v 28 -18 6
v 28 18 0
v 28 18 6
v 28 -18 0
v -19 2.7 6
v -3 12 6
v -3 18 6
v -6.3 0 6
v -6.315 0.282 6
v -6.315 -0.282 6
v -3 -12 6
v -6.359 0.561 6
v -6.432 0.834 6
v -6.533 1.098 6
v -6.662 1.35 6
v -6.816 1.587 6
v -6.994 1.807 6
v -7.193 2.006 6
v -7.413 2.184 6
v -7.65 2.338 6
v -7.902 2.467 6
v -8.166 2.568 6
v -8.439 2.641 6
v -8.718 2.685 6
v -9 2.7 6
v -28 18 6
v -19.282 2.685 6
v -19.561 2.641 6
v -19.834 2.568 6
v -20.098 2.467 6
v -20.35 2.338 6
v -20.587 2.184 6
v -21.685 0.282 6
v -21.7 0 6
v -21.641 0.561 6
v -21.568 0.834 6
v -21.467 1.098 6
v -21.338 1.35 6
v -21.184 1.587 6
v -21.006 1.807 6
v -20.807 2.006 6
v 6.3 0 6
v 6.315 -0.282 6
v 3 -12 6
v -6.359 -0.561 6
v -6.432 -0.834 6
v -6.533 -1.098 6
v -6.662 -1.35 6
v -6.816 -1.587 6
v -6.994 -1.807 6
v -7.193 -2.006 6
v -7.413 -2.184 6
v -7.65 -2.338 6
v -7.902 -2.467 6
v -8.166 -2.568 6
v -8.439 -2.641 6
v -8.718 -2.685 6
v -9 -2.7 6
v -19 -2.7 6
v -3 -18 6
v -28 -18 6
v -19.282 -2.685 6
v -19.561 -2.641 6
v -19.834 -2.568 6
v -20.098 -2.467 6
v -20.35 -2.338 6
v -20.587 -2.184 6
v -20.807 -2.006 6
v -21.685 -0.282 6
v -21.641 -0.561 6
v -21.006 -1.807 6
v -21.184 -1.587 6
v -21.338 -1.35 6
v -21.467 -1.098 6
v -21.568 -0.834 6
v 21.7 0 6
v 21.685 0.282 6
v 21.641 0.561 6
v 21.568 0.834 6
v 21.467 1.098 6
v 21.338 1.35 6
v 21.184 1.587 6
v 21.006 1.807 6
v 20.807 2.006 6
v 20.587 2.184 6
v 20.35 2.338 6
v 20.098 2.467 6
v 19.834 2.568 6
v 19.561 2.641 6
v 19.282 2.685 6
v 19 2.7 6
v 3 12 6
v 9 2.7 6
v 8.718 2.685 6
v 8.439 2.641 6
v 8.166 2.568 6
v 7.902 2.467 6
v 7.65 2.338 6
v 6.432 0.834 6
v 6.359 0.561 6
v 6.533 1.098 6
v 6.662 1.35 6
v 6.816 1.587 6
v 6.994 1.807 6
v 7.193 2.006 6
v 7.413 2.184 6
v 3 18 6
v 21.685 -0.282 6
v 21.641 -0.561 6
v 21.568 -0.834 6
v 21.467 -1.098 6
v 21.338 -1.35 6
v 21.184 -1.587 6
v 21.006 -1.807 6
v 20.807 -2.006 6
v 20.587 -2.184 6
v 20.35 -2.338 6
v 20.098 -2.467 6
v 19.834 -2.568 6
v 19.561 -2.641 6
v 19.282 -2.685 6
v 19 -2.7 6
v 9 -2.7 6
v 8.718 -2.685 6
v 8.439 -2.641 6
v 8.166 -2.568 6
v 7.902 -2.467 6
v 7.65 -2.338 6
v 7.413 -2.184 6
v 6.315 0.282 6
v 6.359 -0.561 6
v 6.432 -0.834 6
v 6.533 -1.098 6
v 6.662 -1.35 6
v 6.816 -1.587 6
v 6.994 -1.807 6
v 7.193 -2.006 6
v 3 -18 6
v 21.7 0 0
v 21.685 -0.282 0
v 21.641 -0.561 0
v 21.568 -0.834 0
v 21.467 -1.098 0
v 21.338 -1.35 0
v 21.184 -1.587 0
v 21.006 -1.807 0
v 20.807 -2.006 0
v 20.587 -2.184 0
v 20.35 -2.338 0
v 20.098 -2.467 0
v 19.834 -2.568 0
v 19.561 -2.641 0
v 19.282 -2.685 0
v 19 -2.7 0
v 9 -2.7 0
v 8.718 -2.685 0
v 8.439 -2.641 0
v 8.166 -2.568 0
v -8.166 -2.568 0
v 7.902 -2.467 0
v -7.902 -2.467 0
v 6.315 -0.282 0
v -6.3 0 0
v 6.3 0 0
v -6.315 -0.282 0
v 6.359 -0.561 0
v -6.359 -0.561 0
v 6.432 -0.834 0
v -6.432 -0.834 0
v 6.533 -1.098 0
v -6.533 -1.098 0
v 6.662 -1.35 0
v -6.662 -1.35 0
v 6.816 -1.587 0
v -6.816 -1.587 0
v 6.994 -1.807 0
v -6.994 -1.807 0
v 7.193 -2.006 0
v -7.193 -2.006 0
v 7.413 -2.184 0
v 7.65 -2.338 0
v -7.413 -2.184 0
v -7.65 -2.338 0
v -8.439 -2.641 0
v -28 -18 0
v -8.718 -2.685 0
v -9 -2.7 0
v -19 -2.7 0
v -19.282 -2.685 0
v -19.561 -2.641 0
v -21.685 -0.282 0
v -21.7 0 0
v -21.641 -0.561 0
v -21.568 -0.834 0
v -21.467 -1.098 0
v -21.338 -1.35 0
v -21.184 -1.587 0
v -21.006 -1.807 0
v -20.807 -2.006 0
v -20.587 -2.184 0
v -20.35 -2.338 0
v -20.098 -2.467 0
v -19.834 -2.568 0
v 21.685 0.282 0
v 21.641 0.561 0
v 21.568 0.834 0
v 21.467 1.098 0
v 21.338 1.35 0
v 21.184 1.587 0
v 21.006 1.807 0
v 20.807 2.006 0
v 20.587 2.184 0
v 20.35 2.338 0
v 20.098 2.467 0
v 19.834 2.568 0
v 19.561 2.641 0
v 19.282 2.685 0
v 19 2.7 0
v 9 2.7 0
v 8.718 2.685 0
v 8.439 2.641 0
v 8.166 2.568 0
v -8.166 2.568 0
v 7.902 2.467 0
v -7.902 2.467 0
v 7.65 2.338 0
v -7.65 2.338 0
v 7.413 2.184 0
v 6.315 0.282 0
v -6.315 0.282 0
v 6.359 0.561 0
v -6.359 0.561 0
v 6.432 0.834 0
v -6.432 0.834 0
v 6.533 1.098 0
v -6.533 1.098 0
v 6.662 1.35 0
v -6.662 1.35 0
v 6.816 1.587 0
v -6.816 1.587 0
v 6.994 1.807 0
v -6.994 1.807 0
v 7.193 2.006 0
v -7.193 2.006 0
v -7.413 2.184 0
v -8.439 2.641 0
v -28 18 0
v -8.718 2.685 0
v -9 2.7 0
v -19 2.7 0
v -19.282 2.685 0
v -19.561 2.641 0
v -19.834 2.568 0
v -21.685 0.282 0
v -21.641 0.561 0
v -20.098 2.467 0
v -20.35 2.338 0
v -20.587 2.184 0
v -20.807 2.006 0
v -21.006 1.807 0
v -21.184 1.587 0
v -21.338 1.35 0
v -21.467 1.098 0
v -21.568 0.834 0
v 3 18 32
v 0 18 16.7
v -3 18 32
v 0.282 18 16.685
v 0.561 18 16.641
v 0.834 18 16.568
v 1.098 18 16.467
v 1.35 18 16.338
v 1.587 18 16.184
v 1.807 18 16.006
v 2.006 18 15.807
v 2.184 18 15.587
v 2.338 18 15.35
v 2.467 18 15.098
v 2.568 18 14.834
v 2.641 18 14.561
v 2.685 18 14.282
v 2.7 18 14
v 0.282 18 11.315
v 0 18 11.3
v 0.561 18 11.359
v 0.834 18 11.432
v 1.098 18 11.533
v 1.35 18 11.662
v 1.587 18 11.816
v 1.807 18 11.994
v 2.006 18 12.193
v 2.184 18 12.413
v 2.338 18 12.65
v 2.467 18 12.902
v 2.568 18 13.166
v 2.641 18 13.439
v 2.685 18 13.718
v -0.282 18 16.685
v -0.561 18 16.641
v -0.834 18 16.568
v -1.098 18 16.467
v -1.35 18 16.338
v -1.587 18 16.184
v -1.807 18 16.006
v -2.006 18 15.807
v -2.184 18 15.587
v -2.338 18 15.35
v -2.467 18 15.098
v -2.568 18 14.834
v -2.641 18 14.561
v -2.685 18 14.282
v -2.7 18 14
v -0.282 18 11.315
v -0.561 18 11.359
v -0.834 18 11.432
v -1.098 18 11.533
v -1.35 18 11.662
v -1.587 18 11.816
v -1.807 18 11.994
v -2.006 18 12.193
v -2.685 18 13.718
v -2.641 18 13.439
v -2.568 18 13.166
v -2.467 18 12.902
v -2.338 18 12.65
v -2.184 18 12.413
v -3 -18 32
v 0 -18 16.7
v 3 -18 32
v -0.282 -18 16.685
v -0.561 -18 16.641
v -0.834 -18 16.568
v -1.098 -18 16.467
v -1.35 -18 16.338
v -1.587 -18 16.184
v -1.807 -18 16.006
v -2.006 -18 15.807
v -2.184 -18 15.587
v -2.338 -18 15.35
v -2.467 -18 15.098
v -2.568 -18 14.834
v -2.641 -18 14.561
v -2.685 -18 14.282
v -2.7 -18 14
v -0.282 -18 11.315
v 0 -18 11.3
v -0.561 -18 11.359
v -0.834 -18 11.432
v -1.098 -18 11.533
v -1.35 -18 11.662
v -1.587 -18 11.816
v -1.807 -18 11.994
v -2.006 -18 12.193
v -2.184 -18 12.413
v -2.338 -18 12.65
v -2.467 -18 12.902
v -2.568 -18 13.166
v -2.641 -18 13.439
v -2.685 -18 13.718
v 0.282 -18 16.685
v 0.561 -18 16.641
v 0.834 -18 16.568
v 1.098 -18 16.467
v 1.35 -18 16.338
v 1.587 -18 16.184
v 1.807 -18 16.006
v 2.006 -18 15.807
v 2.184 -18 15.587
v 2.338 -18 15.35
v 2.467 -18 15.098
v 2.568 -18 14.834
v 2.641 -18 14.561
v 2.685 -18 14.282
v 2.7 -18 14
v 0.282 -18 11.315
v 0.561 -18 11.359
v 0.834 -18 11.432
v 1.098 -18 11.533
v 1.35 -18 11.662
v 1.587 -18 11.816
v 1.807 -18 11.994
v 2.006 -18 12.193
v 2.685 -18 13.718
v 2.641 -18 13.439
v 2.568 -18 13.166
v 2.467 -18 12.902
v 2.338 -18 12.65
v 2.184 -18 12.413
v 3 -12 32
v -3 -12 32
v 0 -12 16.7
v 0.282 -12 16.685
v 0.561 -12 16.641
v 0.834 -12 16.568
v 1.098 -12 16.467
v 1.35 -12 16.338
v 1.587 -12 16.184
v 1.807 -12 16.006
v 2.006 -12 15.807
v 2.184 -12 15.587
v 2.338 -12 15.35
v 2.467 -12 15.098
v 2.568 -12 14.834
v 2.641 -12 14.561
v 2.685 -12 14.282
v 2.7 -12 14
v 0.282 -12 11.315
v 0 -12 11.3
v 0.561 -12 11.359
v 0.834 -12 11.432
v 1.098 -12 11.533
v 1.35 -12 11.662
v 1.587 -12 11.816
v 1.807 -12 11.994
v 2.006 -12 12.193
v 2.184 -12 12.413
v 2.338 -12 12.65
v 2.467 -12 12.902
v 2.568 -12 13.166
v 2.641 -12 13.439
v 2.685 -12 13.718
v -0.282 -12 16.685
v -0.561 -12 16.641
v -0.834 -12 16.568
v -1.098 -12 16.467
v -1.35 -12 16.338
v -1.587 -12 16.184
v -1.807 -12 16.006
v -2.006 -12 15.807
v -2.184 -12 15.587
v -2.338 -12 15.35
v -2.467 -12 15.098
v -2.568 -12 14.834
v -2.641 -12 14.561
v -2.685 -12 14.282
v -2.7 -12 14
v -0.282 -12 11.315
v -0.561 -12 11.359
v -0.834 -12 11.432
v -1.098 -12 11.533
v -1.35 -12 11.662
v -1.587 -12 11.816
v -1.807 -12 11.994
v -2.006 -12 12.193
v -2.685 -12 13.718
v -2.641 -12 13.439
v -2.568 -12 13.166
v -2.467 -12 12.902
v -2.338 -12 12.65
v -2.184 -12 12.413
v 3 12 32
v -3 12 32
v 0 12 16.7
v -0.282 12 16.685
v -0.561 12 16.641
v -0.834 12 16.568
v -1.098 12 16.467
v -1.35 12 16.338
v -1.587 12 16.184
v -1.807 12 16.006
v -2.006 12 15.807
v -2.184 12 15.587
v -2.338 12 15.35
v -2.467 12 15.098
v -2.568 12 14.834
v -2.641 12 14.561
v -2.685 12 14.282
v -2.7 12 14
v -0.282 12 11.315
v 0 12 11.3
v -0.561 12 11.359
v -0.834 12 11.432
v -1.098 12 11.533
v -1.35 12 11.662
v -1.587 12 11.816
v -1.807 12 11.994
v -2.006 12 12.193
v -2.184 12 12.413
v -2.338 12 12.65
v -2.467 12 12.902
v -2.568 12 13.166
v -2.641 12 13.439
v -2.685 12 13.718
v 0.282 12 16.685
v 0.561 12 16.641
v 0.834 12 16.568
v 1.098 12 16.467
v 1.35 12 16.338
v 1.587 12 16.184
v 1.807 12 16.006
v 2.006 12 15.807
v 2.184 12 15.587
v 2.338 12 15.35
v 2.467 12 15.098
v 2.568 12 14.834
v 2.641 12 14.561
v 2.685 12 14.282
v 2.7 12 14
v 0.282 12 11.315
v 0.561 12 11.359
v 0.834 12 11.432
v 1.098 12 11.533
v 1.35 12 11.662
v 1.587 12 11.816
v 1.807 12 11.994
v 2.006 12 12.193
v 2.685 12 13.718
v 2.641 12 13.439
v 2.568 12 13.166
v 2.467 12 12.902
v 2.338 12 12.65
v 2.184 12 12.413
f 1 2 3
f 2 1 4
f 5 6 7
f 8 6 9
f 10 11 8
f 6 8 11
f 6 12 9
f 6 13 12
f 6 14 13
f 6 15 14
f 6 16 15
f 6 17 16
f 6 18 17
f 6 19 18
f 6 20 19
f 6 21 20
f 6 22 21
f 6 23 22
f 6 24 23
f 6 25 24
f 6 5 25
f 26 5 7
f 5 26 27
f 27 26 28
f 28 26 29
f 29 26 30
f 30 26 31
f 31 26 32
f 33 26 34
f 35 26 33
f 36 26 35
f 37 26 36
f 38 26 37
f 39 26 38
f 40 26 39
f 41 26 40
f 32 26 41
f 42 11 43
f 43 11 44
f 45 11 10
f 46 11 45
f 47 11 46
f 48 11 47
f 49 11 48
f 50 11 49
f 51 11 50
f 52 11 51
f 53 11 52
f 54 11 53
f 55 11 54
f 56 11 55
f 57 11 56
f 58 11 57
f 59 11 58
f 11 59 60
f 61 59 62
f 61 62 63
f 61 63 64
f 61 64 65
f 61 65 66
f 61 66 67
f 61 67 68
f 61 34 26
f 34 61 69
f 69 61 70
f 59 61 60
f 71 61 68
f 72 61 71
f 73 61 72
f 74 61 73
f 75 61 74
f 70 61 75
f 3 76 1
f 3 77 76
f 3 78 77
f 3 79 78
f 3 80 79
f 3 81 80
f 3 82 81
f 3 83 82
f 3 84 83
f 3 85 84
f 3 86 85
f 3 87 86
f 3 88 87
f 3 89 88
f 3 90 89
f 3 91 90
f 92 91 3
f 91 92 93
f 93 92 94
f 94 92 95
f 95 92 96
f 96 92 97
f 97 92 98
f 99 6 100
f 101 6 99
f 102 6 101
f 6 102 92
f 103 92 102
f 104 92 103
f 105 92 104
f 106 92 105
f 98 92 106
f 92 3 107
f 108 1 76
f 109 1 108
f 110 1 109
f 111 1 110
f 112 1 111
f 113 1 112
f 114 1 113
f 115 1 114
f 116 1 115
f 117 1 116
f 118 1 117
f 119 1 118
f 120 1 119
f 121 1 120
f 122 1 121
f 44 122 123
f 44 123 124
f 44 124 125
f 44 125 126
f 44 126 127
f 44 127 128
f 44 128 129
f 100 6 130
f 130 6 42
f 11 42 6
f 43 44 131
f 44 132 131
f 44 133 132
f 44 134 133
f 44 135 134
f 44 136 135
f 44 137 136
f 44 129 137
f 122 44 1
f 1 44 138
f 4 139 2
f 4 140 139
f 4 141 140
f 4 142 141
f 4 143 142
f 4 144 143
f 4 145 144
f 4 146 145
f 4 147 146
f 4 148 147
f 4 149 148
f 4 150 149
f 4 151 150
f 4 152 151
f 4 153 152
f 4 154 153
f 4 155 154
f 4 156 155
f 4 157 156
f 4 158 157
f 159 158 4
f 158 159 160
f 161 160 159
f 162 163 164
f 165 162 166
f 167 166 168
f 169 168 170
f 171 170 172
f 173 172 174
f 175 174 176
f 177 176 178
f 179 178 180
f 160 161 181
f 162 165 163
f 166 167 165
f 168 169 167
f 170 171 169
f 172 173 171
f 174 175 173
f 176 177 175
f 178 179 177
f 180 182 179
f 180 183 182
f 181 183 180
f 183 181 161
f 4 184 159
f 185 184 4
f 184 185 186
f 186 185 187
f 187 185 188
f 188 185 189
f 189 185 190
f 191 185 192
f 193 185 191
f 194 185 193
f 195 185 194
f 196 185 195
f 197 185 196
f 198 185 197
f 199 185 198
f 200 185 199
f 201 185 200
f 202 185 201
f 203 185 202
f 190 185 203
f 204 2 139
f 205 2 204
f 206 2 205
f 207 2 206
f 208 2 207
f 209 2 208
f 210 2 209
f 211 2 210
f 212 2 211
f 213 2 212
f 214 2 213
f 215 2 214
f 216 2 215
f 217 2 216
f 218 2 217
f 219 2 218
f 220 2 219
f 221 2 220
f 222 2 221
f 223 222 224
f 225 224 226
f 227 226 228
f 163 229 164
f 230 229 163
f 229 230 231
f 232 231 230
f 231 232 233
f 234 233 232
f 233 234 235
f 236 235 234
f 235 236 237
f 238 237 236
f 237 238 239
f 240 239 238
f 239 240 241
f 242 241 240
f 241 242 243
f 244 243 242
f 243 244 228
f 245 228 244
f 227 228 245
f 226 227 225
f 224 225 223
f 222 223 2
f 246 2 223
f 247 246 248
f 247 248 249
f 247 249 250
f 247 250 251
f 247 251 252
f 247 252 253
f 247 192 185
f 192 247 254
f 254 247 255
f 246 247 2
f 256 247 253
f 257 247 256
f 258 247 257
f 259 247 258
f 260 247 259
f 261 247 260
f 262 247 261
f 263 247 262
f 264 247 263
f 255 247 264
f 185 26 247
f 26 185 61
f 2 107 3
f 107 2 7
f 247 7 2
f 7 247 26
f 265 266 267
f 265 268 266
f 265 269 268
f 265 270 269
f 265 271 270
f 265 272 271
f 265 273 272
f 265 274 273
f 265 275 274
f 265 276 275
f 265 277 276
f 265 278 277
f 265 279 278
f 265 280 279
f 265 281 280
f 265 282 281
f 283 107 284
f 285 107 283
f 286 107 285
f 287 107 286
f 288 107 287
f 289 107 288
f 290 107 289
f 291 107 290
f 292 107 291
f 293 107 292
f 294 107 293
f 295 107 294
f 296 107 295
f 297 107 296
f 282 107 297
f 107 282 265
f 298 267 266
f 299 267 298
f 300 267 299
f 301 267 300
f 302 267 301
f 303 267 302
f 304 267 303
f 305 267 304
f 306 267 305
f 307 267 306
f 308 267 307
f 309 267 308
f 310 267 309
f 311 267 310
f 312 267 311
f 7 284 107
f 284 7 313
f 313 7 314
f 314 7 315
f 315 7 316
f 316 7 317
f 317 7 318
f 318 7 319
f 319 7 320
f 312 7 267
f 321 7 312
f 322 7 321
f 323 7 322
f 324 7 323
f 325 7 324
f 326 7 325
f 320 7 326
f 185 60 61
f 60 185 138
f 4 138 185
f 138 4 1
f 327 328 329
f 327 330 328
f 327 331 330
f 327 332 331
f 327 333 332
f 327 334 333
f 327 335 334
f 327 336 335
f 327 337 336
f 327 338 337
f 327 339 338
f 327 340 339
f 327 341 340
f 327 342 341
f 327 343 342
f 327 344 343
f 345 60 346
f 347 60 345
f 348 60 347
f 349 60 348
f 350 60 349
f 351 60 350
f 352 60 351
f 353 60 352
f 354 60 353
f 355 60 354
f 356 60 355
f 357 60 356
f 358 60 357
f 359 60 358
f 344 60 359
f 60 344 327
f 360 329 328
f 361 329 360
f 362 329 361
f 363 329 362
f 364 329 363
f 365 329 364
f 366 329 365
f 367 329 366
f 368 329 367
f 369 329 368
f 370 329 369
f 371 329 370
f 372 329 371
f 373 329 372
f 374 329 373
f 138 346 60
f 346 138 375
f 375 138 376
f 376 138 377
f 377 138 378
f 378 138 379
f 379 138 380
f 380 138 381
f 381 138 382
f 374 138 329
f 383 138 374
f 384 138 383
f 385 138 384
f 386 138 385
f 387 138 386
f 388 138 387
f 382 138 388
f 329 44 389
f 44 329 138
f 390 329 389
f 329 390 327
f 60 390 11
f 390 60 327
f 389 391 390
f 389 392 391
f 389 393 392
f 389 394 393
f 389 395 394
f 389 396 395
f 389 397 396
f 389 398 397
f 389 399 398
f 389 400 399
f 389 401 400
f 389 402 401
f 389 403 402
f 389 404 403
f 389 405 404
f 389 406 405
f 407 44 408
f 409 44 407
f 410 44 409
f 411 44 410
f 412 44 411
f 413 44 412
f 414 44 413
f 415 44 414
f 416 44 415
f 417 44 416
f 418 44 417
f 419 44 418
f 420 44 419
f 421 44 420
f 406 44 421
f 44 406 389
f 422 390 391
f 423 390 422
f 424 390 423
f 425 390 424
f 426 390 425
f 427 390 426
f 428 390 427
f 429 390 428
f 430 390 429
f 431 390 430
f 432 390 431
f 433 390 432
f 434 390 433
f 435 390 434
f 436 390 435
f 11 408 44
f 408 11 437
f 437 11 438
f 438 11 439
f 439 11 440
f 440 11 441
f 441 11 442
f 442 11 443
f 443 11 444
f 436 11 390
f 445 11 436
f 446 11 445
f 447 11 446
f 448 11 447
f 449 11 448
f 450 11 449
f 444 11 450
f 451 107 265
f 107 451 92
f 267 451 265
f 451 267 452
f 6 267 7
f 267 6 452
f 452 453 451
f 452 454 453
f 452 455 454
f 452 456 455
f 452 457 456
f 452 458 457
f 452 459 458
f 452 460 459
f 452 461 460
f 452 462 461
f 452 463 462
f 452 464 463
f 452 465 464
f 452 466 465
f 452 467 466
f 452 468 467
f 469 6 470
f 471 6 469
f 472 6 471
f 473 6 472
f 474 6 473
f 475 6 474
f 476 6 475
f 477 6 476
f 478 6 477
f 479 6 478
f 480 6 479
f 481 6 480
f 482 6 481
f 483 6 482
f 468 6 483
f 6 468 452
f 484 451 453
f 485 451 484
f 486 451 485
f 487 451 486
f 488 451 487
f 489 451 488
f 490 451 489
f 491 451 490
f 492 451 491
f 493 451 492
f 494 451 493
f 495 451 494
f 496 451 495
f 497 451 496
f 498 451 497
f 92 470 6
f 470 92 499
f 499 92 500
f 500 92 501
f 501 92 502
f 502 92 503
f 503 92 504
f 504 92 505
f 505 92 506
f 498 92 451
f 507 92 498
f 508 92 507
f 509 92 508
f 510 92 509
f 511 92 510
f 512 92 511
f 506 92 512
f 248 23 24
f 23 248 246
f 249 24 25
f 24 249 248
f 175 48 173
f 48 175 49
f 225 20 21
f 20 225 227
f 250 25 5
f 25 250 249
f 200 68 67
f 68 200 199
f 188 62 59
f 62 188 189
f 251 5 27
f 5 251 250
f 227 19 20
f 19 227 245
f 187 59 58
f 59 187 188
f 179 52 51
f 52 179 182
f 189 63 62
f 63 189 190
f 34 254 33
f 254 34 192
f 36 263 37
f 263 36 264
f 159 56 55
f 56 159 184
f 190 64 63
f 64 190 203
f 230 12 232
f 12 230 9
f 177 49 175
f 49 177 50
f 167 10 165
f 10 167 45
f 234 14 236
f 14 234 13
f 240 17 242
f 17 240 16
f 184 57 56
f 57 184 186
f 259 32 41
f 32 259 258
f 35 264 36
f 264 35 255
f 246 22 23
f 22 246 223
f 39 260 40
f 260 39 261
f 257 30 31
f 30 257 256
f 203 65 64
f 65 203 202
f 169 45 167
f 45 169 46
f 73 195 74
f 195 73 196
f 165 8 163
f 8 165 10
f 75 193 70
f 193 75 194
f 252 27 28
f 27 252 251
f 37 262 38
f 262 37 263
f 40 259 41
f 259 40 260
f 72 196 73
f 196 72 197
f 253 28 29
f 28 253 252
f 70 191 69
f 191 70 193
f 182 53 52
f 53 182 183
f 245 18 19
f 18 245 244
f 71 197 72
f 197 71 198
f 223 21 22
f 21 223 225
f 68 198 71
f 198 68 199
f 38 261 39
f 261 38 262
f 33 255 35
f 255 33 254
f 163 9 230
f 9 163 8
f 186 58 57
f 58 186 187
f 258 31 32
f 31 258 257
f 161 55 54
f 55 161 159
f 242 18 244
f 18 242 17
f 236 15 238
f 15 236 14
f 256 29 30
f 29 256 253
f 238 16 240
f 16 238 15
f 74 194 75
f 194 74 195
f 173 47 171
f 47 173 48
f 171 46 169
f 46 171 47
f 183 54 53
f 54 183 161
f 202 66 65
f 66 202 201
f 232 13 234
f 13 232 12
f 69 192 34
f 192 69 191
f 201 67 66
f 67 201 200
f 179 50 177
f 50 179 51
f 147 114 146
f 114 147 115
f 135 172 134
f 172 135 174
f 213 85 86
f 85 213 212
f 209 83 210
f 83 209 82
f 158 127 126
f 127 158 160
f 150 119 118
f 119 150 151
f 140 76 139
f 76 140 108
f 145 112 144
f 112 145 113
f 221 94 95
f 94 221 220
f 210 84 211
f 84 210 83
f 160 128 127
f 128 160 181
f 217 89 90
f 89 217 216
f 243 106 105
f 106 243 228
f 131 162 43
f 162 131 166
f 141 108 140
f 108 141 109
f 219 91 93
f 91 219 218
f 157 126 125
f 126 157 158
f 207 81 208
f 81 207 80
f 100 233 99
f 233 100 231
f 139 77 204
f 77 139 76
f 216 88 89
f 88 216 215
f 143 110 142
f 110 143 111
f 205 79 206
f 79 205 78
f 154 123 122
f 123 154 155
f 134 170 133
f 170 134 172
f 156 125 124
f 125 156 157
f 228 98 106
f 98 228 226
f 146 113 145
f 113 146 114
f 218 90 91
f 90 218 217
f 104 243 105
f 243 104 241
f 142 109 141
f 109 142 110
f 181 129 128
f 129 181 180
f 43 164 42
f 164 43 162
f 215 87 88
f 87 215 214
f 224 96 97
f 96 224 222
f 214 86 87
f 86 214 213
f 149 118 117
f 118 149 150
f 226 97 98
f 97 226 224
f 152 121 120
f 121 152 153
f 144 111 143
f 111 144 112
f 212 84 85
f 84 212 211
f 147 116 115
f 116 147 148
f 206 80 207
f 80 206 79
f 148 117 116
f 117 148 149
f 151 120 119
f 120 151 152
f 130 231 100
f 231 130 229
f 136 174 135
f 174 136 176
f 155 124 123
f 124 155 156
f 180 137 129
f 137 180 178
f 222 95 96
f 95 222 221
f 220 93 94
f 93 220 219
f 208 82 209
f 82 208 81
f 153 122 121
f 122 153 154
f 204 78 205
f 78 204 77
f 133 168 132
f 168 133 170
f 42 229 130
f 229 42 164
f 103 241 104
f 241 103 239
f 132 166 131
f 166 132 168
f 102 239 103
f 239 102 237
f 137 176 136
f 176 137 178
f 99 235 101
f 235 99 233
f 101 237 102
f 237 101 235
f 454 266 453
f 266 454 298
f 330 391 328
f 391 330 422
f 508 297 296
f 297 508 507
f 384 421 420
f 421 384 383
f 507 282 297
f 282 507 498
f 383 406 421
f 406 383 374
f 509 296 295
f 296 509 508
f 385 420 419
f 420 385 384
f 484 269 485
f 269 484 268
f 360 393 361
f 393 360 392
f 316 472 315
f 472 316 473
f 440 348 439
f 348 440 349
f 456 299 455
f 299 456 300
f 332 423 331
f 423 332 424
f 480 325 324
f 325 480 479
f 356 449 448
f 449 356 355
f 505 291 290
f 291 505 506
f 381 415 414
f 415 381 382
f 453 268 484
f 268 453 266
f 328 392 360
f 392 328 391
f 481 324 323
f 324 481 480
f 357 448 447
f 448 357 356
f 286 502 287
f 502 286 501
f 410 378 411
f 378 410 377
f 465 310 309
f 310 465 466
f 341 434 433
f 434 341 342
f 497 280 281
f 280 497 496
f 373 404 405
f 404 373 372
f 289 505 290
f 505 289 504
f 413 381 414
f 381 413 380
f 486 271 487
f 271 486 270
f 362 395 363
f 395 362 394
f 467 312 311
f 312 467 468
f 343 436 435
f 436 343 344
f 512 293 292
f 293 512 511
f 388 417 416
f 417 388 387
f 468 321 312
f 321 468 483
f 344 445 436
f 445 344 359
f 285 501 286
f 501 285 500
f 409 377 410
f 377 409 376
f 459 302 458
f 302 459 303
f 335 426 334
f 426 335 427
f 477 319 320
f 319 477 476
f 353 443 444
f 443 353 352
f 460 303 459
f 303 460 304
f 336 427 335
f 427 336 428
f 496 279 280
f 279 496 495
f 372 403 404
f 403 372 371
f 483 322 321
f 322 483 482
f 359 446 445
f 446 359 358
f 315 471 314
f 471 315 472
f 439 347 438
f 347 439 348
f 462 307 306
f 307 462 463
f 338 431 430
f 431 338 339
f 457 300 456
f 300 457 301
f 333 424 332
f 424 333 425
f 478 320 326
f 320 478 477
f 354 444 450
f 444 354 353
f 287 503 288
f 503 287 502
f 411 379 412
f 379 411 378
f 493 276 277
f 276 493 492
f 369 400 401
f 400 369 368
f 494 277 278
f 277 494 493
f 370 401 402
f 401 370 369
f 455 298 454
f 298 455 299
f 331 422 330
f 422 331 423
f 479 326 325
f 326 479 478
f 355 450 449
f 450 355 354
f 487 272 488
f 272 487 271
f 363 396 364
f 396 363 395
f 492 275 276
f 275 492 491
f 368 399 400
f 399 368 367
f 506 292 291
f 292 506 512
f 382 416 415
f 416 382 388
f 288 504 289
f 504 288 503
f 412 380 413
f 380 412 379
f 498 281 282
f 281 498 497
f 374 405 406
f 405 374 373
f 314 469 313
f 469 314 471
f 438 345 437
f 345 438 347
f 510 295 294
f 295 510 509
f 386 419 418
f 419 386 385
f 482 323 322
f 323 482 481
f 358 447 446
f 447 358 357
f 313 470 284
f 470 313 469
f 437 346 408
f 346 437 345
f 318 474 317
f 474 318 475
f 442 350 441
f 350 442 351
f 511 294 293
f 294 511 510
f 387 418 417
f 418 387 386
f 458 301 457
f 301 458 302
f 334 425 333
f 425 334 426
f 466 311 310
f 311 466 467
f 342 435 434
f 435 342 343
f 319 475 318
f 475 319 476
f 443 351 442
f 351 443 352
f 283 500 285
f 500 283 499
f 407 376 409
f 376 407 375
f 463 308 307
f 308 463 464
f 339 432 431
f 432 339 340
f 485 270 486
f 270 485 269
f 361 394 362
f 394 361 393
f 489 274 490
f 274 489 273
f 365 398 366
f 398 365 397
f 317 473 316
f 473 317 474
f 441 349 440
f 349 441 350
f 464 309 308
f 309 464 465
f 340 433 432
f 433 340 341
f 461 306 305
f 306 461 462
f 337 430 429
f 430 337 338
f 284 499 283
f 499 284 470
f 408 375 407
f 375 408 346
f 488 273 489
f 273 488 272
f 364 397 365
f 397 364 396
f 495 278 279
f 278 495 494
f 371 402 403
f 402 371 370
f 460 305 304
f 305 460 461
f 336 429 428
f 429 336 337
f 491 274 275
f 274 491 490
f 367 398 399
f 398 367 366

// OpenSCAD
// U pivot bracket, 24 mm opening.
$fn = 60;
eps = 0.02;
base_l = 56;
base_w = 36;
base_t = 6;
ear_t = 6;
ear_h = 28;
pivot_d = 5.4;
module mount(x) {
    hull() {
        translate([x - 5, 0, -eps]) cylinder(d = 5.4, h = base_t + 2 * eps);
        translate([x + 5, 0, -eps]) cylinder(d = 5.4, h = base_t + 2 * eps);
    }
}
difference() {
    union() {
        translate([-base_l / 2, -base_w / 2, 0]) cube([base_l, base_w, base_t]);
        translate([-ear_t / 2, -base_w / 2, base_t - 2]) cube([ear_t, ear_t, ear_h]);
        translate([-ear_t / 2, base_w / 2 - ear_t, base_t - 2]) cube([ear_t, ear_t, ear_h]);
    }
    mount(-14); mount(14);
    translate([0, -base_w / 2 - eps, ear_h / 2]) rotate([-90, 0, 0]) cylinder(d = pivot_d, h = base_w + 2 * eps);
}
